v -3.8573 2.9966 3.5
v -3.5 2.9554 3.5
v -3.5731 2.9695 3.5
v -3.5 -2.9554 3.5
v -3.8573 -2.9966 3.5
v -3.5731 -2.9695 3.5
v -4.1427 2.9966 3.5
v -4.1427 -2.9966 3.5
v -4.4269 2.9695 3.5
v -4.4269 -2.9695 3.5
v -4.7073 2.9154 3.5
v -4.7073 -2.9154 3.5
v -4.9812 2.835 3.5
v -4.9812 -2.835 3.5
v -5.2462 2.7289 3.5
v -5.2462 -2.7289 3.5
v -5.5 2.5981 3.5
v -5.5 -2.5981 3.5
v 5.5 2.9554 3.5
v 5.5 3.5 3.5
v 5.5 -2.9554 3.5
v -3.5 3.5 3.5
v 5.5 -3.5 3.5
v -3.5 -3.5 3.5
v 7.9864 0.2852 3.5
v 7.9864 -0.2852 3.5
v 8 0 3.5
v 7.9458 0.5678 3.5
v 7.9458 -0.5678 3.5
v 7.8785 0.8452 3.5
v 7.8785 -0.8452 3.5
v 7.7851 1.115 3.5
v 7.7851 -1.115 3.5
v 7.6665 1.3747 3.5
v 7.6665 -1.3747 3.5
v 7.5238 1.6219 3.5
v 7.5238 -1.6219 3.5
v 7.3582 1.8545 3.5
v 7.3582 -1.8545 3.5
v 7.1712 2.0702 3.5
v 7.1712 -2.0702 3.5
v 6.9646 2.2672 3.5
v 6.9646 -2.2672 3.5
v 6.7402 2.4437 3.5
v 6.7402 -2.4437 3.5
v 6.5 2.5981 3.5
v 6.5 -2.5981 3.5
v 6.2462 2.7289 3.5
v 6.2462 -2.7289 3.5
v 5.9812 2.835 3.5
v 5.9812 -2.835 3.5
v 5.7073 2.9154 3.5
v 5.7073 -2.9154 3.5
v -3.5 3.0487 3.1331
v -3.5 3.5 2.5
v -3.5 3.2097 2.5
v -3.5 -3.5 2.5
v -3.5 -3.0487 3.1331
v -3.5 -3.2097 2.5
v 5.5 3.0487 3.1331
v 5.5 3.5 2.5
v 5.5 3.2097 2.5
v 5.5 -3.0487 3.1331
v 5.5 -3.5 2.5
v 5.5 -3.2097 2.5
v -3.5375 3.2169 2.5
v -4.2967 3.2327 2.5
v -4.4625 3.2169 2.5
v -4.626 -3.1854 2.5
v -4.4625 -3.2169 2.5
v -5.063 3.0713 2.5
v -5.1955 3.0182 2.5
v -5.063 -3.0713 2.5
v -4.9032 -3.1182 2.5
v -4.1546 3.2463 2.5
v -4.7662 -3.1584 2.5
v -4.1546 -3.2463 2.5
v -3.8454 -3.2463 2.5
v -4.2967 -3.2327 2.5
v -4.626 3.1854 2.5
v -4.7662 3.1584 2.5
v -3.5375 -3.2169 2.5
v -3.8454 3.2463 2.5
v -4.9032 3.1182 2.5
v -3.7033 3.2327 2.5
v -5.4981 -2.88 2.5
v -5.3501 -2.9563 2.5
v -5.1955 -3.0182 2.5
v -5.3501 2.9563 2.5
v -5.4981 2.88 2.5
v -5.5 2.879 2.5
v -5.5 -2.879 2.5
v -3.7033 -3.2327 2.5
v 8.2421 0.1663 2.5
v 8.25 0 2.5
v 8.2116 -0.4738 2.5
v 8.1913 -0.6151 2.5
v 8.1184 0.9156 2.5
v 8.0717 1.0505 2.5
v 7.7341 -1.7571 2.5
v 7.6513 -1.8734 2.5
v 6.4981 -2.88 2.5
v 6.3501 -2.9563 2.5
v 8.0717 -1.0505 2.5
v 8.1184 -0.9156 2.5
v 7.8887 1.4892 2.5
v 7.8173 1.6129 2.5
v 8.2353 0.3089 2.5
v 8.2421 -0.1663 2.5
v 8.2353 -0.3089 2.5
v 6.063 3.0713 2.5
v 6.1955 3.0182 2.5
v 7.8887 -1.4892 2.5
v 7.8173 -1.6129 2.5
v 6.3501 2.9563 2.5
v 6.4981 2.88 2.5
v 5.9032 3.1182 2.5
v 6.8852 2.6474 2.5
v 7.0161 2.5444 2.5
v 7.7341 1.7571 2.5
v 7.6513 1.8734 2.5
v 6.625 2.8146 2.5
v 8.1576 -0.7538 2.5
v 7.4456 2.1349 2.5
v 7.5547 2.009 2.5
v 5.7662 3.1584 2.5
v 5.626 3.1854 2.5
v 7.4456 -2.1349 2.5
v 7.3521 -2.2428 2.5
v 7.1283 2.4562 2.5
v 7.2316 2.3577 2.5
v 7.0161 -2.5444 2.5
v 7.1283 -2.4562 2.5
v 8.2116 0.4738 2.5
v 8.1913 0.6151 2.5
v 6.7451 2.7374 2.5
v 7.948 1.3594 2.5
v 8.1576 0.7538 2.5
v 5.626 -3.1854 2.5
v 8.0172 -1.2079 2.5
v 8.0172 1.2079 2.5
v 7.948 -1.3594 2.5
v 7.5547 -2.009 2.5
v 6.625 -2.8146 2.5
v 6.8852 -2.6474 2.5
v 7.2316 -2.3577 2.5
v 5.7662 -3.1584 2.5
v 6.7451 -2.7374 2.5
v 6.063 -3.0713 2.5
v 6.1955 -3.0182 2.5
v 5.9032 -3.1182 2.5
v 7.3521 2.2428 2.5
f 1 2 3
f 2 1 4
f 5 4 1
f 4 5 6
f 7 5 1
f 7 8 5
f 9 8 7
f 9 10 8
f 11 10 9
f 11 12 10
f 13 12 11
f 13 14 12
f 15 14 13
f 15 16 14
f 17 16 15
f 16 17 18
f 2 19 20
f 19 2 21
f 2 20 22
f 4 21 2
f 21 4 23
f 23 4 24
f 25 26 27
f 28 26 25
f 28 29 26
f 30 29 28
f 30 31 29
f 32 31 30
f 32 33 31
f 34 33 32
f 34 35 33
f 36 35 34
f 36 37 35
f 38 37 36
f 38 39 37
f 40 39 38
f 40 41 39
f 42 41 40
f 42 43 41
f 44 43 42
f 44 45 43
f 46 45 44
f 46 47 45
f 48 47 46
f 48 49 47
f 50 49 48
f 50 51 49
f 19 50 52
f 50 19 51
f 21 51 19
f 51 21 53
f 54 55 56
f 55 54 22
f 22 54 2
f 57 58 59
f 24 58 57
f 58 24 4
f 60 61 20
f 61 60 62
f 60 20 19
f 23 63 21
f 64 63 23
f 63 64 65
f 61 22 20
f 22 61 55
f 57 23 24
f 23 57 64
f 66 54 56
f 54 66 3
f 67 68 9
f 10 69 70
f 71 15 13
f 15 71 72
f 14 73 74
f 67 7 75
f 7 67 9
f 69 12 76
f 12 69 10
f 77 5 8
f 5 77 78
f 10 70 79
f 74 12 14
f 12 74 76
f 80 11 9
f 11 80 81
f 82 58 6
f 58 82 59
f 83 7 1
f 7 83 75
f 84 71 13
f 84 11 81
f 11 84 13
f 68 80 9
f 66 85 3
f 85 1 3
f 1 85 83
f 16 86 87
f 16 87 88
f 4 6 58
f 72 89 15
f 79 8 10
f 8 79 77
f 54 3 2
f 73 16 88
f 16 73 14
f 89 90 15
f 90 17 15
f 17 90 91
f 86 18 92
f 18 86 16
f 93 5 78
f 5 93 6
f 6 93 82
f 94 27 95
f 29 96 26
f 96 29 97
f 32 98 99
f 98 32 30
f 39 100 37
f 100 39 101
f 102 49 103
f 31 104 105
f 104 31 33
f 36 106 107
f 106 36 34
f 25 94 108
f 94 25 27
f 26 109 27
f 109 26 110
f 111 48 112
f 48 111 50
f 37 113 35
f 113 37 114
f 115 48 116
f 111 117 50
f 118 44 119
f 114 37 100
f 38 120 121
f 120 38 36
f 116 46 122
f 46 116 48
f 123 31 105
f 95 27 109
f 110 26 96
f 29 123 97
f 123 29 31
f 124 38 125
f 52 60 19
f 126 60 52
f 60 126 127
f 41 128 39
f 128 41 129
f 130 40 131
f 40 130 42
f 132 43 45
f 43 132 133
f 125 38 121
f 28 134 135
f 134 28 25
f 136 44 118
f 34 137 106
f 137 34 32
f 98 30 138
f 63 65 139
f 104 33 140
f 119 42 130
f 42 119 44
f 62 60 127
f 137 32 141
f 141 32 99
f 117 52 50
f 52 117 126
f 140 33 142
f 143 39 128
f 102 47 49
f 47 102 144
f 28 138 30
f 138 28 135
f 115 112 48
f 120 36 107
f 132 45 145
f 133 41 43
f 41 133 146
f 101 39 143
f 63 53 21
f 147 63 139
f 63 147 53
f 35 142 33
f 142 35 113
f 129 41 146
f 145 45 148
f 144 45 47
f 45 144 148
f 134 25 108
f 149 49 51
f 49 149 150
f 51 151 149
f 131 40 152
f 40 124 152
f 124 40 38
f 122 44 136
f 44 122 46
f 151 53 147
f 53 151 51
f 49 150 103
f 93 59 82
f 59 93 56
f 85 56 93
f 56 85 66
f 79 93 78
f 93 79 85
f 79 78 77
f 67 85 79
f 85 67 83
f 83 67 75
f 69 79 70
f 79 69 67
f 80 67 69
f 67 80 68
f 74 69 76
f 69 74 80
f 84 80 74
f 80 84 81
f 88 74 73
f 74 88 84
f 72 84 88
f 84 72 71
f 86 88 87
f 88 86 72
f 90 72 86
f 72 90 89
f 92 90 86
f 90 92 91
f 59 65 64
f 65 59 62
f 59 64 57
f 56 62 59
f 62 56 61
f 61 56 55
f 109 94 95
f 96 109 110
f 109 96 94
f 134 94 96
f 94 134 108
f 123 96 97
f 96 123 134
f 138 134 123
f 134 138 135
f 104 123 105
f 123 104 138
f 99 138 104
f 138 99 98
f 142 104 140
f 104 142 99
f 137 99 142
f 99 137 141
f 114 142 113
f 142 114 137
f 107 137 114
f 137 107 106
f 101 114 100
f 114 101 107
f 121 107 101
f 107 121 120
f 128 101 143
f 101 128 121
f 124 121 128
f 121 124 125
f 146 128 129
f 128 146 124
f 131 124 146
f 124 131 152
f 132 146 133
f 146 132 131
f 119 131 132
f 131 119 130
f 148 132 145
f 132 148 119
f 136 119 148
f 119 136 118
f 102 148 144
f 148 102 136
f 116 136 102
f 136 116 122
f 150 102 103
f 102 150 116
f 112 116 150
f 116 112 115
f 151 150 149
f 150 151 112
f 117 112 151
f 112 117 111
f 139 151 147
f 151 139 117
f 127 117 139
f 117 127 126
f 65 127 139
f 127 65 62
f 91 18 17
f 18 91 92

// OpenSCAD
// file: headband.scad
// headband.scad
// Scale a 100 mm radius sphere to model a head.
// Make it hollow, thickness ~ 1 mm.
// Slice out a headband with a zlow and zhigh cut mark.

//-----------------------------------------------------------
module headband(
gain=1.1,
thick=1.0,
zlow=50,
zhi=60,
r0=100,
tol=0
){
F1=150;

// set base of loop to z=0
translate([0,0,-zlow])

difference(){
  scale([1,0.85,1.25])
  sphere(r=r0*gain+thick,$fn=F1);
  scale([1,0.85,1.25])
  sphere(r=r0*gain,$fn=F1);
 
  // lower cut  
  translate([0,0,-2*r0+zlow])
  cube([3*r0,3*r0,4*r0],center=true);

  // upper cut  
  translate([0,0,2*r0+zhi])
  cube([3*r0,3*r0,4*r0],center=true);

}

}
//===================================================

headband(zlow=62,zhi=68,thick=1.5,gain=1.105);

//====================================================
// main file
// crown1.scad
// First cut at adding the xtals and cheap led string into the headband

use <./ledlamps2.scad>
use <./headband.scad>
use <../Fractals/Lsystem.scad>


//----------------------------------------
module crown1(

N0=10,       // number of baseline points
r0=102,    // radius to get baseline points
F3=8,     // sides on indicators
x5=5.5,    // offset for the lamps
x6=0.4,    // offset for the midway 
z6=10      // offset for the midway
){


  rfoot=4;
  hfoot=3;
  rmid=6;
  hmid=8;
  rtop=8;
  htop=5;
  rlip=6;
  
  F4=88; // sides on foot
  s1=1.5;   // scaling in Y


difference(){
  union(){
    // base channel
    translate([0,0,0])
    headband(zlow=50,zhi=54,thick=3.5);

    // top channel
    translate([0,0,10])
    headband(zlow=58,zhi=59,thick=3.0);

    // main band
    headband(zlow=50,zhi=66);
    
    for(i=[0:N0-1]){
      a0=i*360/N0+180/N0;
      x0=r0*1.0*cos(a0);
      y0=r0*0.855*sin(a0);
      translate([x0,y0,0]){
        rotate([0,0,a0]){
          
          // lamps
          translate([x5,0,0]){
            base1();
            base2();
            // top
            top2();
            //
            translate([0,0,4])
            xa();
            
          }
        }
      }
    }


  } // end union


if(0){
    // in-between light
    for(i=[0:N0-1]){
      a0=i*360/N0;
      x0=r0*1.0*cos(a0);
      y0=r0*0.855*sin(a0);
      translate([x0,y0,0]){
        rotate([0,0,a0]){
          
          // mids
          translate([x6,0,z6]){
            rotate([0,-14,0])
            mid1cut();
          }
        }
      }
    }
}

if(0){
  // repeat the basecuts to eliminate headband material that might interfere
  for(i=[0:N0-1]){
    a0=i*360/N0+180/N0;
    x0=r0*1.0*cos(a0);
    y0=r0*0.855*sin(a0);
    translate([x0,y0,0]){
      rotate([0,0,a0]){
        
        // lamps
        translate([x5,0,0]){
          basecuts();
        }
      }
    }
  } // end for loop
}


} // end diff

if(0){
    // in-between light
    for(i=[0:N0-1]){
      a0=i*360/N0;
      x0=r0*1.0*cos(a0);
      y0=r0*0.855*sin(a0);
      translate([x0,y0,0]){
        rotate([0,0,a0]){
          
          // mids
          translate([x6,0,z6]){
            rotate([0,-14,0]){
            mid1();
            color("cyan")
            //mid2();
            mid3();
          }
          }
        }
      }
    }
}



for(i=[0:N0-1]){
  a0=i*360/N0+180/N0;
  x0=r0*1.0*cos(a0);
  y0=r0*0.855*sin(a0);
  translate([x0,y0,0]){
    rotate([0,0,a0]){
      
        //
        translate([x5,0,4])
        color("white")
        xa();
        
      }
    }
  }
}


//=====================================================

// xtal top lid
if(0){
  //difference(){
  intersection(){
  top2();
  translate([0,0,8])
  cube([40,40,10],center=true);
  }
}

// mid token
if(1){
  //difference(){
  intersection(){
  rotate([0,-90,0])
//  mid2();
  mid3();
  translate([14.5,0,7.5])
  cube([40,40,10],center=true);
  }
}

// midsection:
if(0){
  color("cyan")
  intersection(){

  intersection(){
    union(){
      crown1();
      //tops();
    }
    translate([0,30,0])
    rotate([0,0,20])
    translate([0,0,-40])
    cube([300,300,200]);
  }

  translate([-200,-20,3])
  cube([400,400,10]);
  }
}
// lowsection:
if(0){
  color("red")
  intersection(){

  intersection(){
    union(){
      crown1();
      //tops();
    }
    translate([0,30,0])
    rotate([0,0,20])
    translate([0,0,-40])
    cube([300,300,200]);
  }

  translate([-200,-200,0])
  cube([400,400,3]);
  }
}
// topsection:
if(0){
  intersection(){

  intersection(){
    union(){
      crown1();
      //tops();
    }
    translate([0,30,0])
    rotate([0,0,20])
    translate([0,0,-40])
    cube([300,300,200]);
  }

  translate([-200,-200,13])
  cube([400,400,60]);
  }
}


//=====================================================
